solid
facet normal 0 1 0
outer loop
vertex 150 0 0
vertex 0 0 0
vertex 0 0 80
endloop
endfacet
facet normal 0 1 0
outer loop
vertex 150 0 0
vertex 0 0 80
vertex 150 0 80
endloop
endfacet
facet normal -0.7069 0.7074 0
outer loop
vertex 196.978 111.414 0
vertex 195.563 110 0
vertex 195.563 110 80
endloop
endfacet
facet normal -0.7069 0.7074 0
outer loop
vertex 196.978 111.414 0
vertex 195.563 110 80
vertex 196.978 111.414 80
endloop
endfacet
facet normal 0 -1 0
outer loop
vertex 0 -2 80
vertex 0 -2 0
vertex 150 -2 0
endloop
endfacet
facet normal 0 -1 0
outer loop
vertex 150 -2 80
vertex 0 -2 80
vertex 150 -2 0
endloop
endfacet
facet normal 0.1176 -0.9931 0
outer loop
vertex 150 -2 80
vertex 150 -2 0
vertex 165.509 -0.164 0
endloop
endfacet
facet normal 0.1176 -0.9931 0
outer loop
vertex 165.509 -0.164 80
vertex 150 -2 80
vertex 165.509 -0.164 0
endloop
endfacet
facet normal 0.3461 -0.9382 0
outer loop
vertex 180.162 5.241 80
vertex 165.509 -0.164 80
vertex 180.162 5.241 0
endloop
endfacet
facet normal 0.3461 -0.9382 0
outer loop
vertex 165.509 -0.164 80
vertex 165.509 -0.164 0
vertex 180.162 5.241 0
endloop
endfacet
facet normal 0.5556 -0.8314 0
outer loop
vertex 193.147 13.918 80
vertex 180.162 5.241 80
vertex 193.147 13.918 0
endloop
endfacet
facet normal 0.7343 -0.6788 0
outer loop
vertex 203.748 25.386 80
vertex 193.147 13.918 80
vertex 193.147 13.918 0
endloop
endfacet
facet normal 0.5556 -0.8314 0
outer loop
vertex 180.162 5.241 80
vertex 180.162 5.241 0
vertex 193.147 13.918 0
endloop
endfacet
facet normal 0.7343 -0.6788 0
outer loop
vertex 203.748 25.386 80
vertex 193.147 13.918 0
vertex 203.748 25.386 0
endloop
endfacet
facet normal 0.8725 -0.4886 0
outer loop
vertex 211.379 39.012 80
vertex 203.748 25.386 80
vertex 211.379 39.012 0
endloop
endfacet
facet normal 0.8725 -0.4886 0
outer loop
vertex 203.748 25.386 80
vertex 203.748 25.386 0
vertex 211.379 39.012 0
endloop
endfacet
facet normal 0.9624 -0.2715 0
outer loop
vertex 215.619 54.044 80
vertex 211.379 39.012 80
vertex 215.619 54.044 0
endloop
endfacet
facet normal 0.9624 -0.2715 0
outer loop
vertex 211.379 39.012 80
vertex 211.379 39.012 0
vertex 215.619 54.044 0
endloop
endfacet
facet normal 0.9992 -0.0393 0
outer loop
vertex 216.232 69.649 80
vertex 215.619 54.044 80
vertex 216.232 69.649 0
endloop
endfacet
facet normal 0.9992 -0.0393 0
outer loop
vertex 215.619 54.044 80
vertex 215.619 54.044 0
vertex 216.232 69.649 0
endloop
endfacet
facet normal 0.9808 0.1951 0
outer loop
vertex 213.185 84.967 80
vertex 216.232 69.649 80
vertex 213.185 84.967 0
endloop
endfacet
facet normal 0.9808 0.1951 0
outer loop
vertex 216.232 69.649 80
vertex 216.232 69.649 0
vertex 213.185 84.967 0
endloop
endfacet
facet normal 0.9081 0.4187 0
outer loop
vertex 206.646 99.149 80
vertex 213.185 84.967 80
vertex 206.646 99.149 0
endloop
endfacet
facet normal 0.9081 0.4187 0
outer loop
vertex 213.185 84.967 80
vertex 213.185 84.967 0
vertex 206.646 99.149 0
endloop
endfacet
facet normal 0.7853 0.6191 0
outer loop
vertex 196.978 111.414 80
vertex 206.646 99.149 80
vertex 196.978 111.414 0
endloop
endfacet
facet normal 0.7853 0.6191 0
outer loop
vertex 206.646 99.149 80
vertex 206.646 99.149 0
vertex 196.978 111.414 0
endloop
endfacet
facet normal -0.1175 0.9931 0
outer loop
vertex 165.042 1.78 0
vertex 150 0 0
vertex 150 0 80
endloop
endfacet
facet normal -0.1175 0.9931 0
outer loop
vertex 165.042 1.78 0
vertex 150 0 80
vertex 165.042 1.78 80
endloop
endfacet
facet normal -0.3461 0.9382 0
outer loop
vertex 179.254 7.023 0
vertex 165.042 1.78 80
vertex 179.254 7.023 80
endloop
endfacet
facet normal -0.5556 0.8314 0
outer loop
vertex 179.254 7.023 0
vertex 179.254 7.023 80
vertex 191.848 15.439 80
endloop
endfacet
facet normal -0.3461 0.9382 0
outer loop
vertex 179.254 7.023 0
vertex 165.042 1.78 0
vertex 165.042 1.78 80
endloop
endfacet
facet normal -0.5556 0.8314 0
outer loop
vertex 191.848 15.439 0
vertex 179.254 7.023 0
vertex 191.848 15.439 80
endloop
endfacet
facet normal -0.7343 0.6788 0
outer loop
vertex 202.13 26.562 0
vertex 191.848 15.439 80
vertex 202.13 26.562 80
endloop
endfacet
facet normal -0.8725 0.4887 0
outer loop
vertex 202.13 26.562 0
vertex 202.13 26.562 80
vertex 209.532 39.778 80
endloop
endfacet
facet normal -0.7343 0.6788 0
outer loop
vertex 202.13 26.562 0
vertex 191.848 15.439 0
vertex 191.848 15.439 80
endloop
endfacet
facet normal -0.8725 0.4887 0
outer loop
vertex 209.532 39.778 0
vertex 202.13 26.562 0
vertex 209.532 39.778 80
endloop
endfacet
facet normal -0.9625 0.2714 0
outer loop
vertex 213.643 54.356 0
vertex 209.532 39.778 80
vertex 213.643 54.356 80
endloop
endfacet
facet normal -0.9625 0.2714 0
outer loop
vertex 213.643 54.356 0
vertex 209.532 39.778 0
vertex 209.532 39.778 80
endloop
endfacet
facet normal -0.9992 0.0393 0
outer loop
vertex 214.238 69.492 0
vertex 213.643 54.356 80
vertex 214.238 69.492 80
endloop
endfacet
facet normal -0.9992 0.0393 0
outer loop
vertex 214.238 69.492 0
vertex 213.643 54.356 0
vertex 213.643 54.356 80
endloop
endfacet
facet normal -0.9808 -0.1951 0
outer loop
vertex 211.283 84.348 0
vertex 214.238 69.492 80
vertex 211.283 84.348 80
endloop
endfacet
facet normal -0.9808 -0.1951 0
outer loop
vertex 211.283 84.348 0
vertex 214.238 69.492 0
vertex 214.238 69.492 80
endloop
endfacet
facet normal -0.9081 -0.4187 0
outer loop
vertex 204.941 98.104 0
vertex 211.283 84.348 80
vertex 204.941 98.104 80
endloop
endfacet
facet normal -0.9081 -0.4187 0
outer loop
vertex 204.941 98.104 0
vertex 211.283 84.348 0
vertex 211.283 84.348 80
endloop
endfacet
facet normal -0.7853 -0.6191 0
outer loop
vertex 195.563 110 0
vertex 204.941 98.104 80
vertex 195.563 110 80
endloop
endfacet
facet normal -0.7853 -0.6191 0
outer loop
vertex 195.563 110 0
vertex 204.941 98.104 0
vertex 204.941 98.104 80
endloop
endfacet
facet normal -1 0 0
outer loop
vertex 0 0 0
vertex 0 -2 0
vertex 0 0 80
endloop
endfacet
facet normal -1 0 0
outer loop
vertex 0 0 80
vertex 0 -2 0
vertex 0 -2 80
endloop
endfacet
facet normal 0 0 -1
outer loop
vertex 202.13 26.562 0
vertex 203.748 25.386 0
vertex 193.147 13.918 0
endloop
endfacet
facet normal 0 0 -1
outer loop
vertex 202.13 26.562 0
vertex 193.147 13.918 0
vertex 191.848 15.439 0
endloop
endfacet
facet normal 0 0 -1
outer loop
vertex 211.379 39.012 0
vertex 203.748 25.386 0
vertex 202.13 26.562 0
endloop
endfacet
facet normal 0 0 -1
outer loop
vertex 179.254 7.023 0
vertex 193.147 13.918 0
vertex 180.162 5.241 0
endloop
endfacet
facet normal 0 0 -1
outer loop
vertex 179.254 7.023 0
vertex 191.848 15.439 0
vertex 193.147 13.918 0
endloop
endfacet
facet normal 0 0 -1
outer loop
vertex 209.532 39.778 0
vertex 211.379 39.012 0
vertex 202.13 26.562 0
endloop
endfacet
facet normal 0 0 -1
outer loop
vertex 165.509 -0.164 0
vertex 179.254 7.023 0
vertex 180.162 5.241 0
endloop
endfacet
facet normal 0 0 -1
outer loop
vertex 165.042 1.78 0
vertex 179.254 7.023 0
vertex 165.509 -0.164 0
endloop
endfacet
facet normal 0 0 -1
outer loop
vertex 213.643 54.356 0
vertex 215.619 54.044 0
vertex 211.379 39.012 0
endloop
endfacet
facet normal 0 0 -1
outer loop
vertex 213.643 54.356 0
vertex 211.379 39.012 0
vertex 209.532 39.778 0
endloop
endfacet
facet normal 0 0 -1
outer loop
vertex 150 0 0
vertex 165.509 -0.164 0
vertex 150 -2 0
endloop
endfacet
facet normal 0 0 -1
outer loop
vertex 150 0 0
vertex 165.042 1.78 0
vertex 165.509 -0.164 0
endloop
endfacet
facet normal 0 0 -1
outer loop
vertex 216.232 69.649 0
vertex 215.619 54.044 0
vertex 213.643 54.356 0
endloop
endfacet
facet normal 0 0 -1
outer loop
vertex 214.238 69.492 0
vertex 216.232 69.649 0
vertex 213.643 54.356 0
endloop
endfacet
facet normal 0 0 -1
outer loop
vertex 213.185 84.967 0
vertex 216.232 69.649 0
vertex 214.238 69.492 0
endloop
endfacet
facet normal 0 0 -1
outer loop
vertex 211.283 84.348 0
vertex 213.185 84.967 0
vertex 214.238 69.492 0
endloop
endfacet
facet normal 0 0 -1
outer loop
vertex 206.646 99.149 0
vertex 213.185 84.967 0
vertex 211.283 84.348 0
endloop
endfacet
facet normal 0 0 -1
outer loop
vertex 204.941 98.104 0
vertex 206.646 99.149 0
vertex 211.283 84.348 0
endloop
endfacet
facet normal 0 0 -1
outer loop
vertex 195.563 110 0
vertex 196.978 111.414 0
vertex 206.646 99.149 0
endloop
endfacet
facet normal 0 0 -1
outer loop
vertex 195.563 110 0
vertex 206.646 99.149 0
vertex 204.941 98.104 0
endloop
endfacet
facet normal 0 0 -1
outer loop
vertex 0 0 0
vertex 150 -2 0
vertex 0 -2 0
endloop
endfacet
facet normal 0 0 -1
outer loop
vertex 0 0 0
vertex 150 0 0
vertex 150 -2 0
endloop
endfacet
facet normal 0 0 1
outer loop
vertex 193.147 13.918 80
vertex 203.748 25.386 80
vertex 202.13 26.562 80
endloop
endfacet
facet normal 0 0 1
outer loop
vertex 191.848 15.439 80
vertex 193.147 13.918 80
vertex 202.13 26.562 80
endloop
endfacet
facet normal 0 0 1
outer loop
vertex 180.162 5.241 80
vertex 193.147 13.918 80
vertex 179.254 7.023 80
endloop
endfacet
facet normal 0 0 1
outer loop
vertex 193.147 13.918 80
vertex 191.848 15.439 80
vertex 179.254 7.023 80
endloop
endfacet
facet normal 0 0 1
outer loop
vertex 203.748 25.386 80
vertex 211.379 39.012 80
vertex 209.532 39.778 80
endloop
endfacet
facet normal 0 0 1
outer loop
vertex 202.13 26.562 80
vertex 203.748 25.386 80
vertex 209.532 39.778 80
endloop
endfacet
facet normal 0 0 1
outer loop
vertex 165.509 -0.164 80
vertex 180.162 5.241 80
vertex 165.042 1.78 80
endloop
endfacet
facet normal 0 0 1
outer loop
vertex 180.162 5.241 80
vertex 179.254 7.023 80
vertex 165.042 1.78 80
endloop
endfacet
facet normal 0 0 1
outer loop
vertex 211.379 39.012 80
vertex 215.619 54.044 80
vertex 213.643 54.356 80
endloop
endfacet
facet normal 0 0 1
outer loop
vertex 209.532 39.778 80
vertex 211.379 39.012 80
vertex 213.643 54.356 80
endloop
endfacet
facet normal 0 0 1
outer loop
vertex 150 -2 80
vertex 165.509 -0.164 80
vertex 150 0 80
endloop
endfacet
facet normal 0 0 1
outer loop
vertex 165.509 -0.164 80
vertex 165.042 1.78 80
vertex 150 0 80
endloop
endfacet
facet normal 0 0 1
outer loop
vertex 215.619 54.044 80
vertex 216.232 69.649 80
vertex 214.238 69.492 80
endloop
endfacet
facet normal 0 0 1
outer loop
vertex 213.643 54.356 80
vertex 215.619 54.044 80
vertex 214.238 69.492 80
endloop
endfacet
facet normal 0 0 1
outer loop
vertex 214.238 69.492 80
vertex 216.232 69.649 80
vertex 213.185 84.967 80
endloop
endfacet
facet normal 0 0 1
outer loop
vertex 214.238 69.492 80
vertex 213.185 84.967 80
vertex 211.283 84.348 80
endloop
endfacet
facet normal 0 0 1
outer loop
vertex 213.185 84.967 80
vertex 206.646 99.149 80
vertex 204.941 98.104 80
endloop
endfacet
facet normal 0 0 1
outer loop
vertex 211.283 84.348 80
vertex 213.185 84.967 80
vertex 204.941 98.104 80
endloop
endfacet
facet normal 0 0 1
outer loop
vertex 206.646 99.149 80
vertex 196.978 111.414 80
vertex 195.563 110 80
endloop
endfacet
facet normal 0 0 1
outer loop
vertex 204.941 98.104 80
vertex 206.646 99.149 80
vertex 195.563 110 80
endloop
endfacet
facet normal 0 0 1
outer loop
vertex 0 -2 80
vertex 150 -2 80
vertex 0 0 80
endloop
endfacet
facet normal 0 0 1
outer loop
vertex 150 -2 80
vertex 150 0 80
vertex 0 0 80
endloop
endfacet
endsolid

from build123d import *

# Parameters (mm, degrees)
SURFACE_EXTRUDE1_1_DEPTH = 80
THICKEN1_T2              = 2


with BuildPart() as body_1:
    # Surface-Extrude1: a surface, the sketch's curves swept straight by 80 mm
    with BuildLine(Plane.XY, mode=Mode.PRIVATE) as surface_extrude1_1_path:
        Line((0, 0), (150, 0))
        ThreePointArc((150, 0), (209.531571016, 39.777724035), (195.563491861, 110))
    surface_extrude1_1 = Shell.extrude(surface_extrude1_1_path.wire(), (0 * SURFACE_EXTRUDE1_1_DEPTH, 0 * SURFACE_EXTRUDE1_1_DEPTH, 1 * SURFACE_EXTRUDE1_1_DEPTH))
    add(Solid.thicken(surface_extrude1_1, -THICKEN1_T2))


solid = body_1.part
